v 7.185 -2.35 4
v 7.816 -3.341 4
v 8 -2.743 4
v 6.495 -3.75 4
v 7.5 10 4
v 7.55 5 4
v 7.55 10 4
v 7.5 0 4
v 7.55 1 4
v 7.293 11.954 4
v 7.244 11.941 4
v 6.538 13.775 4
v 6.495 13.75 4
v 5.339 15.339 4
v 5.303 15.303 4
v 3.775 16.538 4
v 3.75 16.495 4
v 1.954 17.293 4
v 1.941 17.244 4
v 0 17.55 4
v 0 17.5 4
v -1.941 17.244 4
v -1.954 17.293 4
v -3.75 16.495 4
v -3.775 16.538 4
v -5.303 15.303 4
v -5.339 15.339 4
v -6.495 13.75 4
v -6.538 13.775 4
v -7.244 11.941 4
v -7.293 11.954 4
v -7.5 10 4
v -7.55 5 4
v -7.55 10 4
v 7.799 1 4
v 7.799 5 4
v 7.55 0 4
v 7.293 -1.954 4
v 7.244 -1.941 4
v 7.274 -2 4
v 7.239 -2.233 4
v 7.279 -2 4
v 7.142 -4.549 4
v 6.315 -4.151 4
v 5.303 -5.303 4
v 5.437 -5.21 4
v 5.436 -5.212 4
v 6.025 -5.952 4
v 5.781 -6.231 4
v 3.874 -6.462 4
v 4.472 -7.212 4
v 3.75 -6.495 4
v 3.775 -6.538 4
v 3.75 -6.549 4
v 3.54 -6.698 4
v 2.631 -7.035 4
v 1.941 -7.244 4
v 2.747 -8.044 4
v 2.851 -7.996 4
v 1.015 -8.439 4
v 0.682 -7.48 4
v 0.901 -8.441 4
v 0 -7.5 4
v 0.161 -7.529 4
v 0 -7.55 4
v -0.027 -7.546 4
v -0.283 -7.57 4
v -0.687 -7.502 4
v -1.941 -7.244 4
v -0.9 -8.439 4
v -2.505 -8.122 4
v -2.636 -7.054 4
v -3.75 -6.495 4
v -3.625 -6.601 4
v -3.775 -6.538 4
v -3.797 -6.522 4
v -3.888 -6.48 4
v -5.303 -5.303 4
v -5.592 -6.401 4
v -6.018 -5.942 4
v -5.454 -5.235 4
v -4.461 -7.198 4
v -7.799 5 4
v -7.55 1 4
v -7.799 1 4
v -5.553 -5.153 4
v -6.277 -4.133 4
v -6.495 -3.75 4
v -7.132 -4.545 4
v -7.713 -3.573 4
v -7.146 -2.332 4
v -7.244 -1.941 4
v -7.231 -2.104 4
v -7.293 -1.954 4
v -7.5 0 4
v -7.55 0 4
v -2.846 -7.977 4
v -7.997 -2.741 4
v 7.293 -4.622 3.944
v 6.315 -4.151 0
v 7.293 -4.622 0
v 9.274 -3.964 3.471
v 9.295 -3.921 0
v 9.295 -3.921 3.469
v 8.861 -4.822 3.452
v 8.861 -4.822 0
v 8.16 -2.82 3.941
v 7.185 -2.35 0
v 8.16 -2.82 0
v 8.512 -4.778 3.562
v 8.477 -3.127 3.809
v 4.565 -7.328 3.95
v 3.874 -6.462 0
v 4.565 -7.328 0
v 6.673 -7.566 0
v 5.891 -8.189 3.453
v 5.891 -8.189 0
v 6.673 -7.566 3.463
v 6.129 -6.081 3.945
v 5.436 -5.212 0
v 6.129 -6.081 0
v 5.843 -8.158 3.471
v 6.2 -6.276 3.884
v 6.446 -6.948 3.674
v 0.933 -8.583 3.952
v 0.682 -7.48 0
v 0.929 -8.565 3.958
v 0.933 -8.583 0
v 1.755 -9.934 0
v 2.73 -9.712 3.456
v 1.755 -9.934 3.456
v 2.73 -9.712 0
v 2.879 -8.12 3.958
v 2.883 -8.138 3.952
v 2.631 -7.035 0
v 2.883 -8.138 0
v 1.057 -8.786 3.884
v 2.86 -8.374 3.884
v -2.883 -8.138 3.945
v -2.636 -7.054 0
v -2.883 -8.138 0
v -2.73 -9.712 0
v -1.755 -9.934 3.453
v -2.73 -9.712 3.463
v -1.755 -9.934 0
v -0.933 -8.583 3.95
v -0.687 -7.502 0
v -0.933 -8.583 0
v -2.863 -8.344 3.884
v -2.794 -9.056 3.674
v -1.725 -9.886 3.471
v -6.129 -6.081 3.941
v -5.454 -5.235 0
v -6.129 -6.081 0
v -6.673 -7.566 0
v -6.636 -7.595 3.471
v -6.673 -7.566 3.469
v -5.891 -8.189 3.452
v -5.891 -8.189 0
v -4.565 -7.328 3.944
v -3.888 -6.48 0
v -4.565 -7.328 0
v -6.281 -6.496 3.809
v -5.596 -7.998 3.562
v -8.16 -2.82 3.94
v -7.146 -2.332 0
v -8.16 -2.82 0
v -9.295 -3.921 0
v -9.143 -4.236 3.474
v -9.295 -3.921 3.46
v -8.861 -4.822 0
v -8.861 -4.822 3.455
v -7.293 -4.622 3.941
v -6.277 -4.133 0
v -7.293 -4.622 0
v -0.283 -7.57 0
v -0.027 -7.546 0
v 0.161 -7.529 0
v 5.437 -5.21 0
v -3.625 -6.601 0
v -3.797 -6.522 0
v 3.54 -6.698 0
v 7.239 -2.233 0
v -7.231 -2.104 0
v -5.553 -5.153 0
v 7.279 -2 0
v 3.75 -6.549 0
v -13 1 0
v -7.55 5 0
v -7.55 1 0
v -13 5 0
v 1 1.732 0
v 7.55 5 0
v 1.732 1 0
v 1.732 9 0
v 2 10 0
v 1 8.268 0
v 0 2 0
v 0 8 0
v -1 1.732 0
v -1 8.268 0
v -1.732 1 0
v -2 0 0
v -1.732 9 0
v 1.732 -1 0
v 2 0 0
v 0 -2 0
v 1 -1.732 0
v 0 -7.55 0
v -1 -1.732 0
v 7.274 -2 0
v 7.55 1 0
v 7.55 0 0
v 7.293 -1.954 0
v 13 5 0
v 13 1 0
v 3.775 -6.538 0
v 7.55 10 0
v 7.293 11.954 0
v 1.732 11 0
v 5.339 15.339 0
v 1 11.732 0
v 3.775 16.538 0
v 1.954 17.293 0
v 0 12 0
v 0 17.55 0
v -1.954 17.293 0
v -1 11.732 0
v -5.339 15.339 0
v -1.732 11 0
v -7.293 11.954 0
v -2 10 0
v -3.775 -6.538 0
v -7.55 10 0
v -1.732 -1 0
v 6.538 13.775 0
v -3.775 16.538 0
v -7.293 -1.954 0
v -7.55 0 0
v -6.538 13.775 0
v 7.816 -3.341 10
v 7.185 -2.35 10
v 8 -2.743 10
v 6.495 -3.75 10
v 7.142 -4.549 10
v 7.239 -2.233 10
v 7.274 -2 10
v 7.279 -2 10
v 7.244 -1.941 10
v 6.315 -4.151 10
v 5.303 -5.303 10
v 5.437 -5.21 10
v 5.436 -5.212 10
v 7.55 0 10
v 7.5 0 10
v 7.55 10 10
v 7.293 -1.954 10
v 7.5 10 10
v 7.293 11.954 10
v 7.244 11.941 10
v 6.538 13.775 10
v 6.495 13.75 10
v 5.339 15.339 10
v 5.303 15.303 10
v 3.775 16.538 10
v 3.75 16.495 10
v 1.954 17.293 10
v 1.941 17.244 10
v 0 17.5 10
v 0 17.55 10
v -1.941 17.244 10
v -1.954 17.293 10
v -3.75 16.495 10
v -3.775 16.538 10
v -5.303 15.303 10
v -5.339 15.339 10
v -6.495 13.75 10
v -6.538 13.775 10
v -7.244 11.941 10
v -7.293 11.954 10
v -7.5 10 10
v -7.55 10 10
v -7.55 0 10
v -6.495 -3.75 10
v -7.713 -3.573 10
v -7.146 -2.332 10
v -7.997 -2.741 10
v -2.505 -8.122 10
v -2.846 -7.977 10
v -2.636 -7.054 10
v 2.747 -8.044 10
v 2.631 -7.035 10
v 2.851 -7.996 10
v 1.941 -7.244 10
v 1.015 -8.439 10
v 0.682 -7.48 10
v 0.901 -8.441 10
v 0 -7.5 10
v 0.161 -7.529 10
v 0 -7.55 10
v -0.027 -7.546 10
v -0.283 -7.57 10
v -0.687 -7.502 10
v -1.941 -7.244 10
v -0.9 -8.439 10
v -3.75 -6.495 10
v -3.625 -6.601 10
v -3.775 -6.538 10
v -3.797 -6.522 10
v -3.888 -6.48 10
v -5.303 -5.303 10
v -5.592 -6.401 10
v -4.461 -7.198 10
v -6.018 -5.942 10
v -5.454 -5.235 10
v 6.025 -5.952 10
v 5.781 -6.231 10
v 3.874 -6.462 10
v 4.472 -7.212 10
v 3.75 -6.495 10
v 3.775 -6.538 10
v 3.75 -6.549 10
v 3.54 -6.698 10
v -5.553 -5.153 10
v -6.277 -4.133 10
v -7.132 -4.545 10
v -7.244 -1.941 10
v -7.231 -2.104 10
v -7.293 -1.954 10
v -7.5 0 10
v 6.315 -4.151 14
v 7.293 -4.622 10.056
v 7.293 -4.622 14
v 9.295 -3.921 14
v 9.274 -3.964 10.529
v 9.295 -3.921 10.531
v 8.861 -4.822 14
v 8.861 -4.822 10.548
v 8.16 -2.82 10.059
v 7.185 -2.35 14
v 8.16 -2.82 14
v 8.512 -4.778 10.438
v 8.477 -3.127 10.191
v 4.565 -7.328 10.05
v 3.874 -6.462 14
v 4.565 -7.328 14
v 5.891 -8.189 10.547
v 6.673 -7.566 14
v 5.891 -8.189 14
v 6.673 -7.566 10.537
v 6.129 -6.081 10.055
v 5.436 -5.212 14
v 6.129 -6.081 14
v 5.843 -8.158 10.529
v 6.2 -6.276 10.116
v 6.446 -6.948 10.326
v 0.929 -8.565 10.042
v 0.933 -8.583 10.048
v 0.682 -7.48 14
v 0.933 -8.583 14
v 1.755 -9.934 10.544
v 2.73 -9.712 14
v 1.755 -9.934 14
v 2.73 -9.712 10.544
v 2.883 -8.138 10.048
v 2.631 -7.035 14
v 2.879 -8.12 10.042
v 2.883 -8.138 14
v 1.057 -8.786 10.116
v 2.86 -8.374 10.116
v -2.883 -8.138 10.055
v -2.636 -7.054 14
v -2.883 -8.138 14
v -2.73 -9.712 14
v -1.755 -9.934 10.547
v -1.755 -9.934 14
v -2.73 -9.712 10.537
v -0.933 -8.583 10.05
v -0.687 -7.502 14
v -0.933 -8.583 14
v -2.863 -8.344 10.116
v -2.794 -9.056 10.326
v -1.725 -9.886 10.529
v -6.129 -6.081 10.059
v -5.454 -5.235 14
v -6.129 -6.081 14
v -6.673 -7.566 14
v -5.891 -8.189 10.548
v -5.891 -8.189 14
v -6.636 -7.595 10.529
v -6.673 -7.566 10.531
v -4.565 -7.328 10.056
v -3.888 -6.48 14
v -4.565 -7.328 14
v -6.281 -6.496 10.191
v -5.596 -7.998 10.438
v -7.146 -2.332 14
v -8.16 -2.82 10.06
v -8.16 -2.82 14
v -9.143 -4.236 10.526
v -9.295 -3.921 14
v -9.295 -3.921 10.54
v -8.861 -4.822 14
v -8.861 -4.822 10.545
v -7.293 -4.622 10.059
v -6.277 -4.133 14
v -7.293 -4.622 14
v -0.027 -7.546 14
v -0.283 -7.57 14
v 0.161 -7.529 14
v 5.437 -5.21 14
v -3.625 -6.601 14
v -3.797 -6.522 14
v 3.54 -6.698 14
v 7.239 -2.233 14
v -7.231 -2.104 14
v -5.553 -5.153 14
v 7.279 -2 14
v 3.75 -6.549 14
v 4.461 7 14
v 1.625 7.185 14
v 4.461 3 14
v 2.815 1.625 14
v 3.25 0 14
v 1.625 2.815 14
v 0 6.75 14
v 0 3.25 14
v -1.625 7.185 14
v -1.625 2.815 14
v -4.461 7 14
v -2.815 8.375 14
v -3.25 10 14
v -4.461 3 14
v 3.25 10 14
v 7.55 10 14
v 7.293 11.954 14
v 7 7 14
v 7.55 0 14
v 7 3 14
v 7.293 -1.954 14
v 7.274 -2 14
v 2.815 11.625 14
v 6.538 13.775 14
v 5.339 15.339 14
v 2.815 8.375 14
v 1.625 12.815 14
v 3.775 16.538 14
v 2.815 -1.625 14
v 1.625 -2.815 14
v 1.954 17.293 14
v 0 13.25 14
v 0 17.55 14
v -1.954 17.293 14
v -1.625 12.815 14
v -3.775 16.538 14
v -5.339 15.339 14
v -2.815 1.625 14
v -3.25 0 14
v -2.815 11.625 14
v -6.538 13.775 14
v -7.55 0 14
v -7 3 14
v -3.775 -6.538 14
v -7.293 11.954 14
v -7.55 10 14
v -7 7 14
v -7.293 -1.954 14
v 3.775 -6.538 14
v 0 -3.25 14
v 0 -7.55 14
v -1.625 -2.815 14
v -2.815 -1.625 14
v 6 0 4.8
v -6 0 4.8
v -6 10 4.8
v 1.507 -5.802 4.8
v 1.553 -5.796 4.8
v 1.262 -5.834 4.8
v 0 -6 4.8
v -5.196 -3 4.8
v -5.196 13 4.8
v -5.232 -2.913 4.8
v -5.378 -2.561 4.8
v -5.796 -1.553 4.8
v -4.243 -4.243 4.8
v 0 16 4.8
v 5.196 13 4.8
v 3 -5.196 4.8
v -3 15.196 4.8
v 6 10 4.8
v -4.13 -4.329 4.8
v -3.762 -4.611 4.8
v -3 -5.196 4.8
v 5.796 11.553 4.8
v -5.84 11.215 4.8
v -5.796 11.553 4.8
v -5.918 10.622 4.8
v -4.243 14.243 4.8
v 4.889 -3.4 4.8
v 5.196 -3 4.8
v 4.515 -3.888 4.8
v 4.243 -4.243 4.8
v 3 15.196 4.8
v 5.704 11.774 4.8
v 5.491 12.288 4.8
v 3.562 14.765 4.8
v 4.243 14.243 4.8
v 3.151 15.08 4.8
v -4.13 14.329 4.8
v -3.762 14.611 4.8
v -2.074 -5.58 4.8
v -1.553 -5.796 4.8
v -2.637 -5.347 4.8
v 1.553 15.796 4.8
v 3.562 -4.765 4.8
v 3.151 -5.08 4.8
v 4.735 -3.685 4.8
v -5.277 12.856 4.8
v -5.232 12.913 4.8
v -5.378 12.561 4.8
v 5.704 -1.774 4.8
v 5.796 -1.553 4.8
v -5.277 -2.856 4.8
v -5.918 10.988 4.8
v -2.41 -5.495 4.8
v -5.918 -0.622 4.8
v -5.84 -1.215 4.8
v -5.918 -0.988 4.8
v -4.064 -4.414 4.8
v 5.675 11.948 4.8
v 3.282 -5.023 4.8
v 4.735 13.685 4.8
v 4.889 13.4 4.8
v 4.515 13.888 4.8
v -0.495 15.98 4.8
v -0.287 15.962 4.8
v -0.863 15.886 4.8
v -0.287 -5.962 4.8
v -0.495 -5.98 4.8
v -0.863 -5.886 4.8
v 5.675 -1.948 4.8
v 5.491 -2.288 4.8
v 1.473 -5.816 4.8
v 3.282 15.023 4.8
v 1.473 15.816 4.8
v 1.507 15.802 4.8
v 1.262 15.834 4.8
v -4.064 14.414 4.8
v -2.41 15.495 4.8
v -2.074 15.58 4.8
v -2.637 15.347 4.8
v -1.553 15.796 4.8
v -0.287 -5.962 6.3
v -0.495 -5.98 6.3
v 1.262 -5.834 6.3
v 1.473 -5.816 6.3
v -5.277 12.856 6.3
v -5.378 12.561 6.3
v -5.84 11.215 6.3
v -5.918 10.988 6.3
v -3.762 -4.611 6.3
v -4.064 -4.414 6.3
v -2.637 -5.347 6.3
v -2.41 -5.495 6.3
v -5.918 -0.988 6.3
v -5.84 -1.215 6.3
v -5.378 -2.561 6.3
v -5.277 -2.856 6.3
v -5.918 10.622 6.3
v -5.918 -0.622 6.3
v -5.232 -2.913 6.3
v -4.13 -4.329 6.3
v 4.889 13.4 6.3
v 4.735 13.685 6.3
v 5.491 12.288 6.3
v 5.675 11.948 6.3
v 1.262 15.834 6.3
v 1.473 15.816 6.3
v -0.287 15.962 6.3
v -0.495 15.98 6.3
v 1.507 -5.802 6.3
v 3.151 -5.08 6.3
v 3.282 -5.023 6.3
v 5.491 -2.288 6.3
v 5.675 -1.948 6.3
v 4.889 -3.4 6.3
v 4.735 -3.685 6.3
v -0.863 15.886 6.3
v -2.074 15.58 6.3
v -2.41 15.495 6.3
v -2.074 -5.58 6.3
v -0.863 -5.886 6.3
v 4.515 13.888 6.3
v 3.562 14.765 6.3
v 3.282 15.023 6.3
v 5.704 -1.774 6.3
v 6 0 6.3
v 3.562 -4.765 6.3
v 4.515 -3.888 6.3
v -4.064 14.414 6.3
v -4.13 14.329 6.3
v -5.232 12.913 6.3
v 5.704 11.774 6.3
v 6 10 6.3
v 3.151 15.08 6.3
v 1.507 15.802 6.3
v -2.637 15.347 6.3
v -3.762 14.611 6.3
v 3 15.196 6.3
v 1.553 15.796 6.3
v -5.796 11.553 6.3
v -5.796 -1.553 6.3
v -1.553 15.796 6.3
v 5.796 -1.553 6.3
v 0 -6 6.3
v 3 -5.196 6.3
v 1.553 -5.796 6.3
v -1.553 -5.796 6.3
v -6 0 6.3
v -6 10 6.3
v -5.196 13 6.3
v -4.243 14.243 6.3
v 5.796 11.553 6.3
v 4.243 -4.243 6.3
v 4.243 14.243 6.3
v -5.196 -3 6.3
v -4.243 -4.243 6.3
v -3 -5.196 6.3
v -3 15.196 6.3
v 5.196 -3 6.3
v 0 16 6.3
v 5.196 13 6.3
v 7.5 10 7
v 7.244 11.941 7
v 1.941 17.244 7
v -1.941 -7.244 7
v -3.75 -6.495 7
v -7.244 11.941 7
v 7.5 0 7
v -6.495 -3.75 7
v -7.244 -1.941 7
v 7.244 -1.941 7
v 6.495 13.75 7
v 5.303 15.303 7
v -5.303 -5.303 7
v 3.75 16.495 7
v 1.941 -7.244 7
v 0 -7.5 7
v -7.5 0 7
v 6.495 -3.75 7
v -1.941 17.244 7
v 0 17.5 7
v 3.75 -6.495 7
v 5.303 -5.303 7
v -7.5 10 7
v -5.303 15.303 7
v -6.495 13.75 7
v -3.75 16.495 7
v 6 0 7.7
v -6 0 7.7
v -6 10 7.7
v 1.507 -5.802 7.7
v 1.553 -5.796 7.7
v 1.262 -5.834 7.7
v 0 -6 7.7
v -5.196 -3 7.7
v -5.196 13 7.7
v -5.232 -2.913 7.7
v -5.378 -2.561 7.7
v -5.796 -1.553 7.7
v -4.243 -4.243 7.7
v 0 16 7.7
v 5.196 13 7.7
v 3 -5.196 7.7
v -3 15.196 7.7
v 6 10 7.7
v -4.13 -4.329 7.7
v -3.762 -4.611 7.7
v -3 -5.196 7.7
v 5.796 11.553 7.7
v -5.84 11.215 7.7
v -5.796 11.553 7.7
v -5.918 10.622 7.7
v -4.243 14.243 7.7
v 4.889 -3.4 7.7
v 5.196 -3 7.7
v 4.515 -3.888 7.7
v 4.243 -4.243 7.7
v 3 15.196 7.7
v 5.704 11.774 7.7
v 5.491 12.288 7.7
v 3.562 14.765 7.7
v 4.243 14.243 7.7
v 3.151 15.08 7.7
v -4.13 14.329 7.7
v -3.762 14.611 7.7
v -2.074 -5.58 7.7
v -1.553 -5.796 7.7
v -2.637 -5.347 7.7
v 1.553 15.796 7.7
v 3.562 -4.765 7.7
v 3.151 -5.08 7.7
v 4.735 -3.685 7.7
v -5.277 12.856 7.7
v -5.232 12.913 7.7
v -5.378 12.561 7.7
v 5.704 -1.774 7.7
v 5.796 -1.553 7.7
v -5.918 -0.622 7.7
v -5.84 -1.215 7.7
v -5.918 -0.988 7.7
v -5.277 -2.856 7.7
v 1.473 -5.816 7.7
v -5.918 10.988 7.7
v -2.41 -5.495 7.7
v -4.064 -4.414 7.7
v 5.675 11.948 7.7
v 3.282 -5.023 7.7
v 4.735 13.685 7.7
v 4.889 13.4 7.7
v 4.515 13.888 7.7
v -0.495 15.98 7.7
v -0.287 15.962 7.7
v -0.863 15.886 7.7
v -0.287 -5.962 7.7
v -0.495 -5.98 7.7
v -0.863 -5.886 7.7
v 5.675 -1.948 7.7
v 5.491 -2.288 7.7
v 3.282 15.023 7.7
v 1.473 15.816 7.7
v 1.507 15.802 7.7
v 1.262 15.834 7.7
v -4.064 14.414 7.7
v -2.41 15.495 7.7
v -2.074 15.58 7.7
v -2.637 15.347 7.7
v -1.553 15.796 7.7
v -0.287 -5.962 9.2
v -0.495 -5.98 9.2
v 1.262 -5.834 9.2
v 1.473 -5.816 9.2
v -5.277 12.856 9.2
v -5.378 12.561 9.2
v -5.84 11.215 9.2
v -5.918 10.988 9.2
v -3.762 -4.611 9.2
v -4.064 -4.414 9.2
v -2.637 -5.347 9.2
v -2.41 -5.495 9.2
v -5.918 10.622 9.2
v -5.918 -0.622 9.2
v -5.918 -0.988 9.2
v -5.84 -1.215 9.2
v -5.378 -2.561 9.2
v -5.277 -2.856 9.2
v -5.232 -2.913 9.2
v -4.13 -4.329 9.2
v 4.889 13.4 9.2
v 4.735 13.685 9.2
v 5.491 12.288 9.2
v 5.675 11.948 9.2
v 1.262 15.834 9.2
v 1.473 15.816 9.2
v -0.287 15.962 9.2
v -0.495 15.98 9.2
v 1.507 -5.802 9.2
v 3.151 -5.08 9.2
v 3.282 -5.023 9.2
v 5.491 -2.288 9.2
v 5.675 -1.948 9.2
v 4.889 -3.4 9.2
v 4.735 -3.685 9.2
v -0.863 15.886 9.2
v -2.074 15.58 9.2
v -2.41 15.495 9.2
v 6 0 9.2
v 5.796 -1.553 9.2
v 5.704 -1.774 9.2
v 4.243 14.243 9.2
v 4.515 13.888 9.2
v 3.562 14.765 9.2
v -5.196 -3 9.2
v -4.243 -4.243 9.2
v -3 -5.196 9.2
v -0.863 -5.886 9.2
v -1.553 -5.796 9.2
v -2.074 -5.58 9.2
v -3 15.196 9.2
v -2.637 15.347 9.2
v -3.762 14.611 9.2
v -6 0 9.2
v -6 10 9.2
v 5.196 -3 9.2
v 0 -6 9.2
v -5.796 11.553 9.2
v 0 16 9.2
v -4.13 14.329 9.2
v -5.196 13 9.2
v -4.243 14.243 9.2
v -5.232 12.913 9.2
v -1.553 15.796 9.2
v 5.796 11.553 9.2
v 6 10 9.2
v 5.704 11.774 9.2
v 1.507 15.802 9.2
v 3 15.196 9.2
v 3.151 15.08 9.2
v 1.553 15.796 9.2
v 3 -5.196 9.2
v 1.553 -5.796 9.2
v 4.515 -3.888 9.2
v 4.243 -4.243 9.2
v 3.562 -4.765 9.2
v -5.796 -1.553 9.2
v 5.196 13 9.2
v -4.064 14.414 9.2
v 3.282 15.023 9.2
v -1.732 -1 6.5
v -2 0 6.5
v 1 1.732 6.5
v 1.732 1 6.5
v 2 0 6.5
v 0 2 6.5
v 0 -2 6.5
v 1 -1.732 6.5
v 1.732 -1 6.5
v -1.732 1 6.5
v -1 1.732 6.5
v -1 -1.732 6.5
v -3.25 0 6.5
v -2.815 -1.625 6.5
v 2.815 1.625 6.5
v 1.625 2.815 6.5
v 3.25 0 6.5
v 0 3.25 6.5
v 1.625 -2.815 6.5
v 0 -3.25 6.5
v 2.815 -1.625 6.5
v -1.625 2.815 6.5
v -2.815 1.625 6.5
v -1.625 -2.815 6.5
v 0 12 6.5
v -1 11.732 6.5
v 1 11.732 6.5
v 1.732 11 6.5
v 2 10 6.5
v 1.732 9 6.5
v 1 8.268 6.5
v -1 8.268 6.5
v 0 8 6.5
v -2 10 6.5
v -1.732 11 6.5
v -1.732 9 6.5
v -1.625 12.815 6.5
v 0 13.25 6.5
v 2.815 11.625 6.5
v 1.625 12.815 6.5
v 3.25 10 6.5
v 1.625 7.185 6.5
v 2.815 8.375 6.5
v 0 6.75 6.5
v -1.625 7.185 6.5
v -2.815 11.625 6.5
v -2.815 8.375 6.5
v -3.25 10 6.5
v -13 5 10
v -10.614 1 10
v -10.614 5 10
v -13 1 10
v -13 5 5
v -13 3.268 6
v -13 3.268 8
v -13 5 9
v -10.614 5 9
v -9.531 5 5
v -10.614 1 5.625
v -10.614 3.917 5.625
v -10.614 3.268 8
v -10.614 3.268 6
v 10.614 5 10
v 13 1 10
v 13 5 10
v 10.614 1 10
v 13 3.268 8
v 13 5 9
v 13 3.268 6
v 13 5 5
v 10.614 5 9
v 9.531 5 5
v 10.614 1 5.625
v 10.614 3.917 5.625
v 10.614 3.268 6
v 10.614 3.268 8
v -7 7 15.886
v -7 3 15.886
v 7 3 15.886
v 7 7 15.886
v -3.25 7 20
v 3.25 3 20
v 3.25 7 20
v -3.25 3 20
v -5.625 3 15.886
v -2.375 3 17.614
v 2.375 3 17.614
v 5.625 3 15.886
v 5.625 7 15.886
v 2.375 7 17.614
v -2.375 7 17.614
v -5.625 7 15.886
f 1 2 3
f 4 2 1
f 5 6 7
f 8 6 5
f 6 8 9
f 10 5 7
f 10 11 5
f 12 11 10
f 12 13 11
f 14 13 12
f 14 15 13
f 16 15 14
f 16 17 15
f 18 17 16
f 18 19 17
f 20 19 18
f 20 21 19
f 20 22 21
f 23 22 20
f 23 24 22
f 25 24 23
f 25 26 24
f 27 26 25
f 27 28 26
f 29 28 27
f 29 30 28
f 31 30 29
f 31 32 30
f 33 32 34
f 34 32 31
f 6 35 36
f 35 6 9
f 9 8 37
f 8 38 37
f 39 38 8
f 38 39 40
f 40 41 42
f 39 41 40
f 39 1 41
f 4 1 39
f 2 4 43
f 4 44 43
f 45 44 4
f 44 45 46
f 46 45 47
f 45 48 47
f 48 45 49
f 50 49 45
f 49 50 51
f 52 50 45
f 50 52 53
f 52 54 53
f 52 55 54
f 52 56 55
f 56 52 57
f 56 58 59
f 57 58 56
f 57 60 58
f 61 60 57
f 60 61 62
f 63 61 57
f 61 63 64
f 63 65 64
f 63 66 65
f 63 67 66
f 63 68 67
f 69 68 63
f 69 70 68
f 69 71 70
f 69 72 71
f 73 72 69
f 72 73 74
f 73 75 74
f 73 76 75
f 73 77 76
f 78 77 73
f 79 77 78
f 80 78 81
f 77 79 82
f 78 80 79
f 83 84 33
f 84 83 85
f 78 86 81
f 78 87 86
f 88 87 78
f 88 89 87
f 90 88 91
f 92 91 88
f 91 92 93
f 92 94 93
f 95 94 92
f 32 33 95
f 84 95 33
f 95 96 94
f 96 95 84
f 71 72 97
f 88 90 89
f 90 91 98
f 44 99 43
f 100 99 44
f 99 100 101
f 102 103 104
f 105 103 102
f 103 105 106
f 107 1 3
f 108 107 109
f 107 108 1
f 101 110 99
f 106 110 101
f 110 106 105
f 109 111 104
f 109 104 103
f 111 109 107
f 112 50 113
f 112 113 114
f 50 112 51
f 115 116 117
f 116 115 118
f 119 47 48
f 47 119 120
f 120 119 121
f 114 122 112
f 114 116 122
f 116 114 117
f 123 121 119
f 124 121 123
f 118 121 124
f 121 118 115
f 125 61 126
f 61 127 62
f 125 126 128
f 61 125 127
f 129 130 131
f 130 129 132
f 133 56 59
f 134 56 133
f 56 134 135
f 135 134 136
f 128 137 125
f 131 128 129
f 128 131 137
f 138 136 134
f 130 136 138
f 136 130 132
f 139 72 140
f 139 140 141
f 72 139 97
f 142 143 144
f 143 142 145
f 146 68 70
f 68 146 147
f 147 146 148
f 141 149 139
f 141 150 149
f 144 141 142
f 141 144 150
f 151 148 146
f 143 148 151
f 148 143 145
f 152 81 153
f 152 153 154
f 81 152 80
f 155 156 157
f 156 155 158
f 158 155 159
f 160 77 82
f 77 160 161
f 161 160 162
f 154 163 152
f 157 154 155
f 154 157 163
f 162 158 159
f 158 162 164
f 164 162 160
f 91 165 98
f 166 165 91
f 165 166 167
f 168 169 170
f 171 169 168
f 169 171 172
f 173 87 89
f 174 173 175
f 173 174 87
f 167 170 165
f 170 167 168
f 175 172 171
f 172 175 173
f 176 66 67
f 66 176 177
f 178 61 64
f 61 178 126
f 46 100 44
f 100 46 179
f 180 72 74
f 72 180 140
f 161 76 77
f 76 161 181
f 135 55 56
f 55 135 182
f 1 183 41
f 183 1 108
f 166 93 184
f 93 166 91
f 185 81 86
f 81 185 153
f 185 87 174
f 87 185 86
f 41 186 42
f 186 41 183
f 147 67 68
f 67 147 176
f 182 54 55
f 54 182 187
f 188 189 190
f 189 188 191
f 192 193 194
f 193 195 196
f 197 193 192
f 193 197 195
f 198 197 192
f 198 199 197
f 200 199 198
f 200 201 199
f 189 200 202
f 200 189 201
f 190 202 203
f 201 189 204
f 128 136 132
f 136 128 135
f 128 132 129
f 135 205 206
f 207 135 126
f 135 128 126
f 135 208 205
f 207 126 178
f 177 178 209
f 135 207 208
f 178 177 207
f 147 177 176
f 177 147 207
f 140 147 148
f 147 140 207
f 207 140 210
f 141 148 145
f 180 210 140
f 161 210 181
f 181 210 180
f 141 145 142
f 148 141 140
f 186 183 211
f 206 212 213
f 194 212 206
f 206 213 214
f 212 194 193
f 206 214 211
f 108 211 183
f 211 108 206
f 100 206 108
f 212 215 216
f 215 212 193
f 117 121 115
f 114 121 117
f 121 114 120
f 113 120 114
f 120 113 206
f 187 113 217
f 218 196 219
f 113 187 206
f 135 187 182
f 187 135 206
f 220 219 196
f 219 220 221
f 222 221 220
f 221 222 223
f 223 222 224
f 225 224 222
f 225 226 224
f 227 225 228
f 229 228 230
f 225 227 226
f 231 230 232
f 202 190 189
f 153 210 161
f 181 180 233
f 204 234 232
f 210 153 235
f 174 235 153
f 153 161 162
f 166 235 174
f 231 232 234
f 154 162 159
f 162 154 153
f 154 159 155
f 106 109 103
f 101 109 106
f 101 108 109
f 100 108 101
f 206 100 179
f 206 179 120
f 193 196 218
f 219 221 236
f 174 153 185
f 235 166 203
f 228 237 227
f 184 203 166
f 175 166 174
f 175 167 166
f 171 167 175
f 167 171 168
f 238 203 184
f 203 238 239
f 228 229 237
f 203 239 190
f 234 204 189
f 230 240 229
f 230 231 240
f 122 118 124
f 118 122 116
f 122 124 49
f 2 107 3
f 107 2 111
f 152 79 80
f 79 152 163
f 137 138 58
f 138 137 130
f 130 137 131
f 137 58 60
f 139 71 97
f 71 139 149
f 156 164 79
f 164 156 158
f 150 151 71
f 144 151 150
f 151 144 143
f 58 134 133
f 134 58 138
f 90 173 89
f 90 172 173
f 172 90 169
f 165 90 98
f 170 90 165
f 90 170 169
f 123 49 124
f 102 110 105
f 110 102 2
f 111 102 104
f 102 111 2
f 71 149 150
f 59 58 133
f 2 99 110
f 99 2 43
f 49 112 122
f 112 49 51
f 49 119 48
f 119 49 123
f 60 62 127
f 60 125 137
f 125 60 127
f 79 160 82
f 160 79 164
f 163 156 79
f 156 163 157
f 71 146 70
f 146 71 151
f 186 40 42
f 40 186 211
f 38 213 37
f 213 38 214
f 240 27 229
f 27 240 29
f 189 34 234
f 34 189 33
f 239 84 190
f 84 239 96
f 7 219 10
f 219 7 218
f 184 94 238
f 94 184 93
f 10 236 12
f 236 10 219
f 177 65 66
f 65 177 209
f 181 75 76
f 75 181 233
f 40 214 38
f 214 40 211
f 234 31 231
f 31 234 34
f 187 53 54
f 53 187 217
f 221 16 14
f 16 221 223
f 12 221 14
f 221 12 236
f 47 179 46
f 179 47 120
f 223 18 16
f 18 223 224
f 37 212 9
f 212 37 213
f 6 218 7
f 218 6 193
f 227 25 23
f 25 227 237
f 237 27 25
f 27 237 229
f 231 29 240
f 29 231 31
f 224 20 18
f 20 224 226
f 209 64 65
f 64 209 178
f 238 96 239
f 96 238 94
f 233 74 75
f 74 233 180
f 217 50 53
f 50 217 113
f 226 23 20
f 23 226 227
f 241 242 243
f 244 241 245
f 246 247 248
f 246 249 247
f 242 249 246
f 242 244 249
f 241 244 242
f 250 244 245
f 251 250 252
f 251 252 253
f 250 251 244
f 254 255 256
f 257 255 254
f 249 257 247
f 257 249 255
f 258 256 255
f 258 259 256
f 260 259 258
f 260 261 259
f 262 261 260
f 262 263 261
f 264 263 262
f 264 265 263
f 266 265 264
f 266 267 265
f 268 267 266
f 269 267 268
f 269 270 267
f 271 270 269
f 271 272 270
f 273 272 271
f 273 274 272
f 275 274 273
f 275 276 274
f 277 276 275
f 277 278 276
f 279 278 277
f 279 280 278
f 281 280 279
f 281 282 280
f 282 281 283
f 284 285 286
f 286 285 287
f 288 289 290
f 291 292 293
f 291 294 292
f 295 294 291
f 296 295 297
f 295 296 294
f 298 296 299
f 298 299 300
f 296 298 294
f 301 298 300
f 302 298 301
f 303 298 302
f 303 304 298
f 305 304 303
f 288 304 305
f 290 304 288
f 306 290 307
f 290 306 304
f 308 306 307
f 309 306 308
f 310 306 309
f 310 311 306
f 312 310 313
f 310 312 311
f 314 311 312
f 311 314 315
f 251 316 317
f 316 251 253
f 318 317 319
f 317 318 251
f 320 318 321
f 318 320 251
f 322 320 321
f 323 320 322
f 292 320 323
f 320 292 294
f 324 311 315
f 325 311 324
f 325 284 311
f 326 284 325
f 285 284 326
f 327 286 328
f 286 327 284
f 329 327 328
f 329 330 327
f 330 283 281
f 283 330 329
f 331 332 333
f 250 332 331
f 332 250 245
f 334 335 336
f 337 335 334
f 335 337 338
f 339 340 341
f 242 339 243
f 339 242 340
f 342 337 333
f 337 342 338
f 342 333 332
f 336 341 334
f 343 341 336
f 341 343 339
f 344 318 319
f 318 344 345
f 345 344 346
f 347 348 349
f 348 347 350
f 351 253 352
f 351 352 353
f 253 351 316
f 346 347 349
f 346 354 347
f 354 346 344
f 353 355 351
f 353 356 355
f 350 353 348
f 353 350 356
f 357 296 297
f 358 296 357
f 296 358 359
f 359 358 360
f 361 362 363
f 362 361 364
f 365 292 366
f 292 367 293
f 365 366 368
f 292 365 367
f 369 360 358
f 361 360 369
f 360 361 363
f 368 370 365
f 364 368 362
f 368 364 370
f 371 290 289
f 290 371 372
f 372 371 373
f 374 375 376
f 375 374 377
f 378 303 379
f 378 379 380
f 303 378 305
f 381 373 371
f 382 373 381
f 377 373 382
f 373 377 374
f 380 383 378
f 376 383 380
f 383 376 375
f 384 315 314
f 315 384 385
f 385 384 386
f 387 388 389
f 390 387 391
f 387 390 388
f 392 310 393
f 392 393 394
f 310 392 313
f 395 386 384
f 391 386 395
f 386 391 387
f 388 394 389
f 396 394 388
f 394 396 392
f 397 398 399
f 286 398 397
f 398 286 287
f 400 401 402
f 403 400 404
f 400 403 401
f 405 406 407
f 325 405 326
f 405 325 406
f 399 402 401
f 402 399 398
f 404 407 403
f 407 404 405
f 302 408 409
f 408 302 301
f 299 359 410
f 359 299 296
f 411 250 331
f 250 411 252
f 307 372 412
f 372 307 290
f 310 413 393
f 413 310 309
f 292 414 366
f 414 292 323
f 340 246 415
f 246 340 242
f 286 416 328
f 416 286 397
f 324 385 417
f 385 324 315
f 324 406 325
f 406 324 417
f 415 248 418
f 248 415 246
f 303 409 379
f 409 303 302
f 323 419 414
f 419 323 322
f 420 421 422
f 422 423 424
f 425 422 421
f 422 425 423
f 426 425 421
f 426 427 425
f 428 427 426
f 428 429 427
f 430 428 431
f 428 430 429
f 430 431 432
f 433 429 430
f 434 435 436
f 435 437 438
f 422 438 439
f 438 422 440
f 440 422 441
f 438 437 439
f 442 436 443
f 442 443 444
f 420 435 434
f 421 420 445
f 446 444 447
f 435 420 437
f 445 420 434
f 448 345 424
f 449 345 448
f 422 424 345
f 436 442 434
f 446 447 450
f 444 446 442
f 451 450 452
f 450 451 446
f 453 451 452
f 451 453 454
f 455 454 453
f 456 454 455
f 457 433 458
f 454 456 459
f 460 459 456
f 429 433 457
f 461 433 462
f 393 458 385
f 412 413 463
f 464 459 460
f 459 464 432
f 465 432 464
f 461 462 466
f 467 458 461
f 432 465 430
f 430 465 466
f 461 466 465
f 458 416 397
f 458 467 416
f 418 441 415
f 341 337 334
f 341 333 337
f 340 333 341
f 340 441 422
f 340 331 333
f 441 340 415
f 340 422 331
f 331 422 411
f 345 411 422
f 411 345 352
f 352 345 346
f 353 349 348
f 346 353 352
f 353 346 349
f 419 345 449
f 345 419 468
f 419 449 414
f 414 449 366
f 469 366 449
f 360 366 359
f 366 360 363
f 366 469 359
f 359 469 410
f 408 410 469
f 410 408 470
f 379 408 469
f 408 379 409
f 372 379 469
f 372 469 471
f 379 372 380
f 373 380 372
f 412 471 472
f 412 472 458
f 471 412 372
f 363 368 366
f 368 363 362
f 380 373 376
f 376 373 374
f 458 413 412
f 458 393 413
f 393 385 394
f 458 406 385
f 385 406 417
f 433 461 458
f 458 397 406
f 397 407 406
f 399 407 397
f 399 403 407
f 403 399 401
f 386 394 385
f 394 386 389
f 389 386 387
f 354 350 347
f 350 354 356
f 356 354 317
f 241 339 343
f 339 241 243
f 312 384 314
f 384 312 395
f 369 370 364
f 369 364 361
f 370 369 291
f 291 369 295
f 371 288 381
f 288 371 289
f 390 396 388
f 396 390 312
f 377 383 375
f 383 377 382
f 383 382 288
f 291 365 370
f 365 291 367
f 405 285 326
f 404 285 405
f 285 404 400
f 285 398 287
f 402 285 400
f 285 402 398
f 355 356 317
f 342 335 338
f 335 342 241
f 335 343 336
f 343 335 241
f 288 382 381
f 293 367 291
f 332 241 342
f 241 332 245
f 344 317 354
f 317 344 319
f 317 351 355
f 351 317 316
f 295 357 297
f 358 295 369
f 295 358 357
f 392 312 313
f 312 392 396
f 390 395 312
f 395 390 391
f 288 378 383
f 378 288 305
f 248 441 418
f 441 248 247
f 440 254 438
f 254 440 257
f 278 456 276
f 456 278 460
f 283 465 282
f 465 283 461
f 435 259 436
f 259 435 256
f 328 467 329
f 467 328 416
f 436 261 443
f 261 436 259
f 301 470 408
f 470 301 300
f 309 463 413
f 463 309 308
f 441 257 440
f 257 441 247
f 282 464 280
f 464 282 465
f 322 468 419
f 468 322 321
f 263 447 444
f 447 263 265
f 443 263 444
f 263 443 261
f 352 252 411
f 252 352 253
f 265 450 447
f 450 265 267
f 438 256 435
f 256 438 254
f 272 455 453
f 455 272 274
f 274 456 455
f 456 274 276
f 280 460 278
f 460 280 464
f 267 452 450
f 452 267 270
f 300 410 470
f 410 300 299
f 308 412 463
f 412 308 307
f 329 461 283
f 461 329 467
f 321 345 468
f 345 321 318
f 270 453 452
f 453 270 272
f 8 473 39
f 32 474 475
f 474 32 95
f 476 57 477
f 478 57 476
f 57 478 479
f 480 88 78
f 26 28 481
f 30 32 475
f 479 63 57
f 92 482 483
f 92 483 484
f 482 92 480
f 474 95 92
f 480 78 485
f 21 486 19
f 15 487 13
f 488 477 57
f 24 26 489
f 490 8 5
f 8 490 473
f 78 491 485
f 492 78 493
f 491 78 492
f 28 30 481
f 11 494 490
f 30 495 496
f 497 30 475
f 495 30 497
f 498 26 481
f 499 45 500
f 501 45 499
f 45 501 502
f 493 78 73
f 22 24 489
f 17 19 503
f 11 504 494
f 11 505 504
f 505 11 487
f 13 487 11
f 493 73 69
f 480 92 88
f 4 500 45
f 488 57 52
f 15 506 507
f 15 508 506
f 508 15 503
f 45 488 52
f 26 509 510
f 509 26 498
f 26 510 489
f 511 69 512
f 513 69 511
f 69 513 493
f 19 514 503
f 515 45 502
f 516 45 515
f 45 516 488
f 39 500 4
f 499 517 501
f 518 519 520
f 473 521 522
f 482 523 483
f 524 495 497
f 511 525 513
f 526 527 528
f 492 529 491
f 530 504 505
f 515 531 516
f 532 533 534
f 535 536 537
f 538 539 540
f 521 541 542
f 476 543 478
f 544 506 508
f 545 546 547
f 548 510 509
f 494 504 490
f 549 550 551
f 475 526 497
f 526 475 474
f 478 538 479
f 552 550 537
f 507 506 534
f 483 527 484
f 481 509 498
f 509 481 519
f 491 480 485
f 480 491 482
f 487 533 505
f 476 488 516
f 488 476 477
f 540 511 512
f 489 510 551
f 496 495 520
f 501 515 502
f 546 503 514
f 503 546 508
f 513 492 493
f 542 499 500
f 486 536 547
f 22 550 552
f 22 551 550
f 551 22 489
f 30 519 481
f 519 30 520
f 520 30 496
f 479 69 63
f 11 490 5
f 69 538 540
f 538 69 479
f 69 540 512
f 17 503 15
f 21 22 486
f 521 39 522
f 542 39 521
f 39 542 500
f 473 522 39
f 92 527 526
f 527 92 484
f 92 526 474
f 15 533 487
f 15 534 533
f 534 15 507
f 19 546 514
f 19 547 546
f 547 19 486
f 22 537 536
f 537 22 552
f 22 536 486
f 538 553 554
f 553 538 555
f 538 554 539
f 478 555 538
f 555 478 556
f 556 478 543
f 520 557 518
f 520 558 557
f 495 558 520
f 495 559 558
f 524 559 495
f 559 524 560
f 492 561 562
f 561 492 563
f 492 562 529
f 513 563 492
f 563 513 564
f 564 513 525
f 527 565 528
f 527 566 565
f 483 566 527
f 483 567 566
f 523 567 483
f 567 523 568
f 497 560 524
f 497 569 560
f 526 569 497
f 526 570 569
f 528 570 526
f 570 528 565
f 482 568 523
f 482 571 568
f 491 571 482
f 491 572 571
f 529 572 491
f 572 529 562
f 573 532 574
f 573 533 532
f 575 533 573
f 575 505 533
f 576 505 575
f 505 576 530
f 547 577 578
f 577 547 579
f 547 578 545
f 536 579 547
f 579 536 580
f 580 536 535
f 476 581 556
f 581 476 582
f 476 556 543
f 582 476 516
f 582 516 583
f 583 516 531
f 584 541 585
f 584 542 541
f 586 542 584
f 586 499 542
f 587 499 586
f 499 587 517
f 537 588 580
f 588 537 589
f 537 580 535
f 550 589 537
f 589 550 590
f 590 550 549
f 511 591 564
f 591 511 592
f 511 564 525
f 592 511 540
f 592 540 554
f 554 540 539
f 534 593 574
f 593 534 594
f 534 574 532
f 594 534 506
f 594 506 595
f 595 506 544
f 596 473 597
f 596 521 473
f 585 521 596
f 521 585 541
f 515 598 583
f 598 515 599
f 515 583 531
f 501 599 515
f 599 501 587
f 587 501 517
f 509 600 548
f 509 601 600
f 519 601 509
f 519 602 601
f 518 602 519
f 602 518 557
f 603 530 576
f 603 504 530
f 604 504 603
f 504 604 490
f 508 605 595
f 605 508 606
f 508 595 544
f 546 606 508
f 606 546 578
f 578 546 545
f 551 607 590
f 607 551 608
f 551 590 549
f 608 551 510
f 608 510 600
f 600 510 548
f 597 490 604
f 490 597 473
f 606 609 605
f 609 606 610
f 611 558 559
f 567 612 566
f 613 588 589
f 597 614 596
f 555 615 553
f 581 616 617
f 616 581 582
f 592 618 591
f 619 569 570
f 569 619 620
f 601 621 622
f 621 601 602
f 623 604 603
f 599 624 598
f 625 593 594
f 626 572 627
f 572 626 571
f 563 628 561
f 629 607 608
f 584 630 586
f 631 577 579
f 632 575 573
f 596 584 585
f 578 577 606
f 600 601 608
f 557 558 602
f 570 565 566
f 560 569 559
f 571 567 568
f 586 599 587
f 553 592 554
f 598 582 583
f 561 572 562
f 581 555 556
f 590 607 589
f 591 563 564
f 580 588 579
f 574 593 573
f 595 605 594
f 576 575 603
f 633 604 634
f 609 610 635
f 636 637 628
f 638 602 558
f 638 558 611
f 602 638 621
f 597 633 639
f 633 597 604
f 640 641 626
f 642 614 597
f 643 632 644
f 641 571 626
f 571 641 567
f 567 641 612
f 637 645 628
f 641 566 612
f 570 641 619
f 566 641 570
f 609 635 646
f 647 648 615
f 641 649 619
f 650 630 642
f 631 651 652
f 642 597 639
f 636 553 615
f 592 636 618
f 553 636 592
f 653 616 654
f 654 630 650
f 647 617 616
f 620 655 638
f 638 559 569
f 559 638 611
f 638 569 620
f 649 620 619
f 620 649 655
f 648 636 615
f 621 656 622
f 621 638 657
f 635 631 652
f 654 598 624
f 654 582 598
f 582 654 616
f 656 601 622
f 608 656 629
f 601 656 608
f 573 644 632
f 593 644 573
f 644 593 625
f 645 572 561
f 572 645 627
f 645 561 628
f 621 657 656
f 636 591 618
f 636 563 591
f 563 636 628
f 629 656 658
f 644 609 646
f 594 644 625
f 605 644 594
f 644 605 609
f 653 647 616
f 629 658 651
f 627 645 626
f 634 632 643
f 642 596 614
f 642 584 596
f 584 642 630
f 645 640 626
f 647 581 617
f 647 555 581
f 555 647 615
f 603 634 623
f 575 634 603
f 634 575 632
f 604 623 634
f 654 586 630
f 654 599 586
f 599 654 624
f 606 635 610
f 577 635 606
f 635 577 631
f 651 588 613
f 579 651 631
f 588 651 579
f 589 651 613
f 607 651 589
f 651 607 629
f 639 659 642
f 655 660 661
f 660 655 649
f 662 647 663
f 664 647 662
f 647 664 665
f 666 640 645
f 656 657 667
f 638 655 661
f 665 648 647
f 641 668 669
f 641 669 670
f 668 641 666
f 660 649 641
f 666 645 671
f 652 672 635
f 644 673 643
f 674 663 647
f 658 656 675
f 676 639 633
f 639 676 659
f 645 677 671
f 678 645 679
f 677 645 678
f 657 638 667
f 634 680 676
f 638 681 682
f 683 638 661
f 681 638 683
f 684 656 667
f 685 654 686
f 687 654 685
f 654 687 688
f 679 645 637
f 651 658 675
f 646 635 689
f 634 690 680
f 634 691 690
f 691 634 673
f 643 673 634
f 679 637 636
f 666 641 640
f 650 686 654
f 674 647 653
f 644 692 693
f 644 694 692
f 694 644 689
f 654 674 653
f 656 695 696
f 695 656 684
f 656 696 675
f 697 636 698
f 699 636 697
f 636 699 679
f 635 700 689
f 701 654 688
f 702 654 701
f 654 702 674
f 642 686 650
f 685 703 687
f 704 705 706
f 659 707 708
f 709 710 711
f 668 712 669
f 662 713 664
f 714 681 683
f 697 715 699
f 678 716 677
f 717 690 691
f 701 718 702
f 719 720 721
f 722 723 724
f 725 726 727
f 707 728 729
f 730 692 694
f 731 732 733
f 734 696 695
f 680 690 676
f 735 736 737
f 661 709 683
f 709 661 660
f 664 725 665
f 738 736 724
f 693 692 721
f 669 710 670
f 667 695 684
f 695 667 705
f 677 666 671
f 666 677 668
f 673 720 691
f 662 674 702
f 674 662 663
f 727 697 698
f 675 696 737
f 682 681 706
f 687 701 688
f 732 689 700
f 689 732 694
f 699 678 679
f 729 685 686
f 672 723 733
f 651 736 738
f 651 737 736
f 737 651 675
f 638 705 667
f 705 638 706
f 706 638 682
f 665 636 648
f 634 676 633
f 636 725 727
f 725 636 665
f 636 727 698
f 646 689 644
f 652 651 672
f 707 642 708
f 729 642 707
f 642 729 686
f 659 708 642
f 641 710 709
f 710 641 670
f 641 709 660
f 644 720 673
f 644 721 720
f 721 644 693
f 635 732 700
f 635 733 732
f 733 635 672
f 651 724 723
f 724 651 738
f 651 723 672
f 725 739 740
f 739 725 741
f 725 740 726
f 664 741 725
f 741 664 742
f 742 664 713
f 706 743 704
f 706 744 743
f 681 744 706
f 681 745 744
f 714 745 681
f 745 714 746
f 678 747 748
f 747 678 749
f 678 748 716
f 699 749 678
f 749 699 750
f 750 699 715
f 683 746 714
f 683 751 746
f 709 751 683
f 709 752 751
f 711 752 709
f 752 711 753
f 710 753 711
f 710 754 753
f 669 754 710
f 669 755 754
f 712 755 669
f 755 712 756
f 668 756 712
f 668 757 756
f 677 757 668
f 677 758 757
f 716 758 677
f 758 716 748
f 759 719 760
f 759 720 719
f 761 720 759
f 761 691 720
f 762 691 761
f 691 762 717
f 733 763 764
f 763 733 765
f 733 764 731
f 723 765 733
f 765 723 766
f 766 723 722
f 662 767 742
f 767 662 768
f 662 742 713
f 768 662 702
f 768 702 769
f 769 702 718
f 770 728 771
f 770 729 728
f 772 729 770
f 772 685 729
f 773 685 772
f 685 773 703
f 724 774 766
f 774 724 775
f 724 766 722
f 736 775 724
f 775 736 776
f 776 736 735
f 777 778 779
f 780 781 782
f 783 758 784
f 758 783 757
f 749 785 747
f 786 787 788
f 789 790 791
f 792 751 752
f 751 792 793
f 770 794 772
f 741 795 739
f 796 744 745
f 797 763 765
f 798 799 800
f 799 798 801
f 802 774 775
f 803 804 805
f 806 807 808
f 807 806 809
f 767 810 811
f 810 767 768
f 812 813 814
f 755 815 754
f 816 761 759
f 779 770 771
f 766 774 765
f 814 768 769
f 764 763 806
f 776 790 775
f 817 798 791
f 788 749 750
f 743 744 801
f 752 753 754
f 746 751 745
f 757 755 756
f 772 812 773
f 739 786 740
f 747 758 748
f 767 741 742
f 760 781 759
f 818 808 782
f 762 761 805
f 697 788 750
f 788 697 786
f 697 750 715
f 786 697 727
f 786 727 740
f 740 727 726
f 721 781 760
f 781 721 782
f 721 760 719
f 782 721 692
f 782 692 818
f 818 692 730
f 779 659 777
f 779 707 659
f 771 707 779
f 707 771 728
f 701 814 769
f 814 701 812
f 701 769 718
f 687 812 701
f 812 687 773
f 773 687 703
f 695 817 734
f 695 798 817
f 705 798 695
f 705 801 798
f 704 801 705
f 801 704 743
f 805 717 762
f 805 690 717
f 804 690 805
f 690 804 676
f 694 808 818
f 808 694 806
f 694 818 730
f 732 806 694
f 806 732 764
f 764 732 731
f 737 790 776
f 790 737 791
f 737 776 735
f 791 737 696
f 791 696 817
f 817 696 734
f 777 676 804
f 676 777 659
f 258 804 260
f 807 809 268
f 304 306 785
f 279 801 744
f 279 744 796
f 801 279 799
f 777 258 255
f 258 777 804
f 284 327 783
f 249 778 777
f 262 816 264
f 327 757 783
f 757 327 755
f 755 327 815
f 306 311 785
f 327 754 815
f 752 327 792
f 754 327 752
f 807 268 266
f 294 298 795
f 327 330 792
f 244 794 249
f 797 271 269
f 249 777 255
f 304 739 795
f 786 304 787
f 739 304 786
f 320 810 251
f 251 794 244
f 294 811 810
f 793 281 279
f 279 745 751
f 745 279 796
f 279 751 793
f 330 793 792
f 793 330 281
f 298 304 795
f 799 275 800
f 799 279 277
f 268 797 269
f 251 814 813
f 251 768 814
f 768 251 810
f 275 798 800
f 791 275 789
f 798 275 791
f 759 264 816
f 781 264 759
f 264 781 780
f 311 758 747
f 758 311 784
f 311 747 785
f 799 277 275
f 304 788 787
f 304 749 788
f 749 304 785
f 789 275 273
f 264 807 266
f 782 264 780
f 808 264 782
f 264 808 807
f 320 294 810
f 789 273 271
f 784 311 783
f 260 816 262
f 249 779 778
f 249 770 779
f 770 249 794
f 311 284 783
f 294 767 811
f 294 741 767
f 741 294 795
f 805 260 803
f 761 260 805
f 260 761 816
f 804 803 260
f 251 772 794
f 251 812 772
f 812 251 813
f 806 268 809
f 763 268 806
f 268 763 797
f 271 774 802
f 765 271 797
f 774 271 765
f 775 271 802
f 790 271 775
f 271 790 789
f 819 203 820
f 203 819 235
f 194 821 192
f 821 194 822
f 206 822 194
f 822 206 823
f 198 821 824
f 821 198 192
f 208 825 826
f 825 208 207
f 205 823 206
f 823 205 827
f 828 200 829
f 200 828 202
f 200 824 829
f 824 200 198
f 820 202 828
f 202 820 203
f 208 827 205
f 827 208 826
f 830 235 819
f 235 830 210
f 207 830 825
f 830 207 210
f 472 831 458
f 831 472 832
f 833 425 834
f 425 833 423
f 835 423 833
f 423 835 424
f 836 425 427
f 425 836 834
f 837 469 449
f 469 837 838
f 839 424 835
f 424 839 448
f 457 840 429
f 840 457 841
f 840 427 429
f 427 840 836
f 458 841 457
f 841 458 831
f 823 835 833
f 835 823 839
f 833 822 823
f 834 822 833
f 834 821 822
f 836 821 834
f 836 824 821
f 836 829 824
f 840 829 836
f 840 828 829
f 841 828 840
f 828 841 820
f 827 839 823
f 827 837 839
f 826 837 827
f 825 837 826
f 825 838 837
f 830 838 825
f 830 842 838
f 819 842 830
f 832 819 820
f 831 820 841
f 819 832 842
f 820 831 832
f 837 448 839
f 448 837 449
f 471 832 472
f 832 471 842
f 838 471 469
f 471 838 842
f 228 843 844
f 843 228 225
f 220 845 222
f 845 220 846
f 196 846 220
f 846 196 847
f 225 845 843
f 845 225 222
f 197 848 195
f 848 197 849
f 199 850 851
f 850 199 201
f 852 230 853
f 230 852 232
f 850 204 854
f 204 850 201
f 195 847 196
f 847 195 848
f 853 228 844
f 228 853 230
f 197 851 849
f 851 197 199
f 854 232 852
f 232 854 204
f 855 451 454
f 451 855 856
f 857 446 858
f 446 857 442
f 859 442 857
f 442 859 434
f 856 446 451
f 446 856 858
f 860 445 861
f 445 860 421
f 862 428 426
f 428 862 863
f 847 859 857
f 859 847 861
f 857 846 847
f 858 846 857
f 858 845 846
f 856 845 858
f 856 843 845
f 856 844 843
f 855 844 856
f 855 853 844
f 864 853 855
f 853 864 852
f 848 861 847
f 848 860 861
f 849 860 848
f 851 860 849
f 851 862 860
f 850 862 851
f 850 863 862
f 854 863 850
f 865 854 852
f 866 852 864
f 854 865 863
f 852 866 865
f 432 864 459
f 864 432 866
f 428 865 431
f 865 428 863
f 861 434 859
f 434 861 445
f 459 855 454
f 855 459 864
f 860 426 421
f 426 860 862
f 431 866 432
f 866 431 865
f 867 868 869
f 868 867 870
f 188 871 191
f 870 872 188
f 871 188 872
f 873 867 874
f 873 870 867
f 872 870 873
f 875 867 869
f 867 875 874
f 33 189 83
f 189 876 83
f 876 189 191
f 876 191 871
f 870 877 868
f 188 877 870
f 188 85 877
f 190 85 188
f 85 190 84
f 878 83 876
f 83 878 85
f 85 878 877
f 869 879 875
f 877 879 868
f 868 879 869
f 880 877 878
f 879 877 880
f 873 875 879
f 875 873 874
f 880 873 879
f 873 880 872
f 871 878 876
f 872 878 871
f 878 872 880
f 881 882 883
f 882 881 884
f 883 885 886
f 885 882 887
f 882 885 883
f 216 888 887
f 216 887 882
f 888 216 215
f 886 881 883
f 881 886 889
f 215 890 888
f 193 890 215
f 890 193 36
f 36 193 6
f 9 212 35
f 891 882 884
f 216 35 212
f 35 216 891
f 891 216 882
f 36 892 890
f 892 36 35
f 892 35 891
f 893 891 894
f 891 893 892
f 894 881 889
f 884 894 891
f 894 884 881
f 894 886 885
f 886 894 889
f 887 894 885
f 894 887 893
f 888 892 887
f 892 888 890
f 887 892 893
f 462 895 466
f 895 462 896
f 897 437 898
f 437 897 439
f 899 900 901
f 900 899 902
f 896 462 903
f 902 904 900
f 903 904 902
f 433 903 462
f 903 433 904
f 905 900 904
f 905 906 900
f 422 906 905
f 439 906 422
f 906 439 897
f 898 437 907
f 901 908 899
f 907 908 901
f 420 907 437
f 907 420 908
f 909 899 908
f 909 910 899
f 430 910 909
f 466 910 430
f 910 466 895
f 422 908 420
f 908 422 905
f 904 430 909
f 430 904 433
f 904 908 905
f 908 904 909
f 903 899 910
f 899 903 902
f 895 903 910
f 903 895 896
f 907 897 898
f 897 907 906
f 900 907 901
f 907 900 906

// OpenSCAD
// file: gearModule.scad
/* the original one was posted by by Entropic
 * on Jan 30, 2015; 5:25pm,  on OpenSCAD official forum
 *
 * License? by official author:
 * "Also I thought that someone might benefit from this if they aren't able to make a gear themselves."
 *
 */

numberOfTeeth = 20;
widthOfTeeth = 4;
heightOfTeeth = 5;
thicknessOfGear = 5;
radiusOfHoleForShaft = 4.242640687;  //If shaft is square, find the square of one side,
sidesOfShaft = 4;                    //multiply by two and then square root that to get radius
//diameter = ((teethNo x 1.7 x teethWidth)/pi)+ 2teethHeight

module tooth(width, thickness, height){
  scale([width/5,thickness/5,height/10]){
    difference(){
      translate([-2.5,0,0])
      cube([5,5,10]);
      translate([5+1.25-2.5,0-1,0])
      rotate([0,-14.0362434,0])
        cube([5,5+2,12]);
      translate([0-1.25-2.5,0+5+1,0])
      rotate([0,-14.0362434,180])
        cube([5,5+2,12]);
    }
  }
}
module gear(toothNo, toothWidth, toothHeight, thickness,holeRadius,holeSides){
  radius = (toothWidth*1.7*toothNo)/3.141592653589793238/2;
  rotate([-90,0,0])
  difference(){
    union(){
      for(i=[0:toothNo]){
        rotate([0,(360/toothNo)*i,0])
        translate([0,0,radius-0.5])
          tooth(toothWidth,thickness,toothHeight);
      }
      translate([0,thickness,0])
      rotate([90,0,0])
        cylinder(r=radius, h=thickness);
    }
  translate([0,thickness+1,0])
  rotate([90,0,0])
    cylinder(r=holeRadius,h=thickness+2,$fn=holeSides);
  }
}

module gearInside(toothNo, toothWidth, toothHeight, thickness,holeRadius,holeSides){
  radius = (toothWidth*1.7*toothNo)/3.141592653589793238/2;
  rotate([-90,0,0])
//  difference(){
    union(){
      for(i=[0:toothNo]){
        rotate([0,(360/toothNo)*i,0])
        translate([0,0,radius-0.5])
            mirror([0,0,1])
                translate([0,0,-toothHeight]) 
                    tooth(toothWidth,thickness,toothHeight);
      }
    }
//  translate([0,thickness+1,0])
//  rotate([90,0,0])
//    cylinder(r=holeRadius,h=thickness+2,$fn=holeSides);
//  }
}


//gear(numberOfTeeth,widthOfTeeth,heightOfTeeth,thicknessOfGear,radiusOfHoleForShaft,sidesOfShaft);

gearInside(numberOfTeeth,widthOfTeeth,heightOfTeeth,thicknessOfGear,radiusOfHoleForShaft,sidesOfShaft);

// tooth(toothWidth,thickness,toothHeight);

tooth(widthOfTeeth,thicknessOfGear,heightOfTeeth);

numberOfTeeth = 20;
widthOfTeeth = 4;
heightOfTeeth = 5;
thicknessOfGear = 5;
radiusOfHoleForShaft = 4.242640687;  //If shaft is square, find the square of one side,
sidesOfShaft = 4;                    //multiply by two and then square root that to get radius
//diameter = ((teethNo x 1.7 x teethWidth)/pi)+ 2teethHeight

module tooth(width, thickness, height){
  scale([width/5,thickness/5,height/10]){
    difference(){
      translate([-2.5,0,0])
      cube([5,5,10]);
      translate([5+1.25-2.5,0-1,0])
      rotate([0,-14.0362434,0])
        cube([5,5+2,12]);
      translate([0-1.25-2.5,0+5+1,0])
      rotate([0,-14.0362434,180])
        cube([5,5+2,12]);
    }
  }
}
module gear(toothNo, toothWidth, toothHeight, thickness,holeRadius,holeSides){
  radius = (toothWidth*1.7*toothNo)/3.141592653589793238/2;
  rotate([-90,0,0])
  difference(){
    union(){
      for(i=[0:toothNo]){
        rotate([0,(360/toothNo)*i,0])
        translate([0,0,radius-0.5])
          tooth(toothWidth,thickness,toothHeight);
      }
      translate([0,thickness,0])
      rotate([90,0,0])
        cylinder(r=radius, h=thickness);
    }
  translate([0,thickness+1,0])
  rotate([90,0,0])
    cylinder(r=holeRadius,h=thickness+2,$fn=holeSides);
  }
}

gear(numberOfTeeth,widthOfTeeth,heightOfTeeth,thicknessOfGear,radiusOfHoleForShaft,sidesOfShaft);
// main file
use <gearModule.scad>

module gear2(thick=5,flip=false) // height 15
{
    translate([0,0,0])
    intersection()
    {
        translate([0,0,thick])
            gear(toothNo=14, toothWidth=2,
                 toothHeight=3, thickness=thick,
                 holeRadius=0,holeSides=4);

        union()
        {
            r1=11.5;
            r2 = 8.5;
            
            if(flip) {
            cylinder( r1=r2,r2=r1,h=thick/4);
            translate([0,0,thick/4]) cylinder( r1=r1,r2=r1,h=3*thick/4);
            }
            else
            {
            translate([0,0,0]) cylinder( r1=r1,r2=r1,h=3*thick/4);
            translate([0,0,3*thick/4]) cylinder( r1=r1,r2=r2,h=thick/4);
            }
        }
    }
}

module spool(a=1,r1=8.5,r2=7.5,maintrackextra=0) {
    //middle
    hull() {
        translate( [0,0,0] )
            cylinder( r1=r1, r2=r2, h=a );
        translate( [0,10,0] )
            cylinder( r1=r1, r2=r2, h=a );
    }
    
    hull() {
        translate( [0,0,a] )
            cylinder( r1=r2, r2=r2, h=a+maintrackextra );
        translate( [0,10,a] )
            cylinder( r1=r2, r2=r2, h=a+maintrackextra );
    }
    hull() {
        translate( [0,0,2*a+maintrackextra] )
            cylinder( r1=r2, r2=r1, h=a );
        translate( [0,10,2*a+maintrackextra] )
            cylinder( r1=r2, r2=r1, h=a );
    }
}

module bottom(l=8)
{
    // 3/4 of a gear
    intersection()
    {
        gear2(4);
        translate([-10,-12,0]) cube([20,12,5]); // cut in half
        rotate([0,0,-30]) translate([-10,-12,0]) cube([20,12,5]); // cut top couple teeth
    }
    // structure between gears:
    hull() {
        cylinder( d=15.1, h=4 );
        translate([0,l,0]) cylinder( d=15.1, h=4 );
    }
    // second gear, rotated to fit properly into first one's teeth
    
    translate([0,l,0]) mirror([0,1,0]) intersection()
    {
        rotate([0,0,360/14/2]) gear2(4);
        translate([-10,-12-2,0]) cube([20,12,5]); // cut in half
        rotate([0,0,-35]) translate([-10,-12,0]) cube([20,12,5]); // cut top couple teeth
    }
}

module metacarpal_bottom(l=8)
{
    // 3/4 of a gear
    intersection()
    {
        rotate([0,0,360/14/2]) gear2(4);
        translate([-10,-12-2,0]) cube([20,12,5]); // cut in half
        rotate([0,0,-15]) translate([-10,-12,0]) cube([20,12,5]); // cut top couple teeth
    }
    // structure between gears:
    hull() {
        cylinder( d=15.1, h=4 );
        translate([0,l,0]) cylinder( d=15.1, h=4 );
    }
}

module spool2(r1=8.5,r2=7.5,a=1,b=1,c=1,length=8) {
    
    
    //middle
    hull() {
        translate( [0,0,0] )
            cylinder( r1=r1, r2=r2, h=a );
        translate( [0,length,0] )
            cylinder( r1=r1, r2=r2, h=a );
    }
    
    hull() {
        translate( [0,0,a] )
            cylinder( r1=r2, r2=r2, h=b );
        translate( [0,length,a] )
            cylinder( r1=r2, r2=r2, h=b );
    }
    hull() {
        translate( [0,0,a+b] )
            cylinder( r1=r2, r2=r1, h=c );
        translate( [0,length,a+b] )
            cylinder( r1=r2, r2=r1, h=c );
    }
}



/*    tunnels are shorter !!!! */
module metacarpal(full=true)
{
    metacarpal_length = 10;
    difference()
    {
        union()
        {
            metacarpal_bottom(l=metacarpal_length);
            translate([0,0,14]) mirror([0,0,1]) metacarpal_bottom(l=metacarpal_length);
            
            translate([0,0,4])
                spool2(r1=7.5,r2=6,a=0.8,b=1.5,c=0.7,length=metacarpal_length);
            translate([0,0,7])
                spool2(r1=7.5,r2=6,a=0.7,b=1.5,c=0.8,length=metacarpal_length);
        }
        translate([0,0,-2]) cylinder( d=4, h=20, $fn=12 ); // 3mm screw
        translate([0,0,12-5.5]) cylinder( d=6.5, h=5+5.5, $fn=12 ); // screw head

        translate([0,metacarpal_length,-2]) cylinder( d=4, h=20, $fn=12 ); // 3mm screw
        translate([0,metacarpal_length,12-5.5]) cylinder( d=6.5, h=5+5.5, $fn=12 ); // screw head
    }


    // springs - 1
    translate([-13,1,0])
    {
        difference() 
        {
            cube( [6,4,10] );
            translate([6.5,-1,8]) rotate([-90,90,0]) cylinder(d=9.5,h=20,$fn=6); // main hole
//            translate([0,-1,0]) rotate([-90,90,0]) cylinder(d=9.5,h=20,$fn=6); // lower trim
            translate([-1,4,7]) rotate([0,90,0]) cylinder(d=4,h=20,$fn=6); // upper trim
        }
    }
    
    // springs - 2
    mirror([1,0,0])
    translate([-13,1,0])
    {
        difference() 
        {
            cube( [6,4,10] );
            translate([6.5,-1,8]) rotate([-90,90,0]) cylinder(d=9.5,h=20,$fn=6); // main hole
//            translate([0,-1,0]) rotate([-90,90,0]) cylinder(d=9.5,h=20,$fn=6); // lower trim
            translate([-1,4,7]) rotate([0,90,0]) cylinder(d=4,h=20,$fn=6); // upper trim
        }
    }
    
    rotate([0,0,180])
    {
        // glue side mounts to the main body
        translate([-13,-5,0])
                cube( [8,4,4] );
        translate([5,-5,0])
                cube( [8,4,4] );
        
        // control wire:
        translate([-8,-4-3,20]) rotate([0,90,0])
        {
            difference() 
            {
                translate([0,0,1]) cube( [6,4,14] );
                translate([6.5,-1,8]) rotate([-90,90,0]) cylinder(d=9.5,h=20,$fn=6); // main hole
                translate([0,-1,16]) rotate([-90,90,0]) cylinder(d=9.5,h=20,$fn=6); // upper trim
                translate([0,-1,0]) rotate([-90,90,0]) cylinder(d=9.5,h=20,$fn=6); // lower trim
            }
        }
    }
    
    
}


module metacarpal_mount(full=true)
{
    metacarpal_length = 10;
    difference()
    {
        
        hull() {
            cylinder( d=15.1, h=3 );
            translate([0,metacarpal_length,0]) cylinder( d=15.1, h=3 );
        }
                        
        translate([0,0,-2]) cylinder( d=4, h=20, $fn=12 ); // 3mm screw
        translate([0,metacarpal_length,-2]) cylinder( d=4, h=20, $fn=12 ); // 3mm screw
    }
   
    
}


// show this:
metacarpal();
// or:
//metacarpal_mount();
